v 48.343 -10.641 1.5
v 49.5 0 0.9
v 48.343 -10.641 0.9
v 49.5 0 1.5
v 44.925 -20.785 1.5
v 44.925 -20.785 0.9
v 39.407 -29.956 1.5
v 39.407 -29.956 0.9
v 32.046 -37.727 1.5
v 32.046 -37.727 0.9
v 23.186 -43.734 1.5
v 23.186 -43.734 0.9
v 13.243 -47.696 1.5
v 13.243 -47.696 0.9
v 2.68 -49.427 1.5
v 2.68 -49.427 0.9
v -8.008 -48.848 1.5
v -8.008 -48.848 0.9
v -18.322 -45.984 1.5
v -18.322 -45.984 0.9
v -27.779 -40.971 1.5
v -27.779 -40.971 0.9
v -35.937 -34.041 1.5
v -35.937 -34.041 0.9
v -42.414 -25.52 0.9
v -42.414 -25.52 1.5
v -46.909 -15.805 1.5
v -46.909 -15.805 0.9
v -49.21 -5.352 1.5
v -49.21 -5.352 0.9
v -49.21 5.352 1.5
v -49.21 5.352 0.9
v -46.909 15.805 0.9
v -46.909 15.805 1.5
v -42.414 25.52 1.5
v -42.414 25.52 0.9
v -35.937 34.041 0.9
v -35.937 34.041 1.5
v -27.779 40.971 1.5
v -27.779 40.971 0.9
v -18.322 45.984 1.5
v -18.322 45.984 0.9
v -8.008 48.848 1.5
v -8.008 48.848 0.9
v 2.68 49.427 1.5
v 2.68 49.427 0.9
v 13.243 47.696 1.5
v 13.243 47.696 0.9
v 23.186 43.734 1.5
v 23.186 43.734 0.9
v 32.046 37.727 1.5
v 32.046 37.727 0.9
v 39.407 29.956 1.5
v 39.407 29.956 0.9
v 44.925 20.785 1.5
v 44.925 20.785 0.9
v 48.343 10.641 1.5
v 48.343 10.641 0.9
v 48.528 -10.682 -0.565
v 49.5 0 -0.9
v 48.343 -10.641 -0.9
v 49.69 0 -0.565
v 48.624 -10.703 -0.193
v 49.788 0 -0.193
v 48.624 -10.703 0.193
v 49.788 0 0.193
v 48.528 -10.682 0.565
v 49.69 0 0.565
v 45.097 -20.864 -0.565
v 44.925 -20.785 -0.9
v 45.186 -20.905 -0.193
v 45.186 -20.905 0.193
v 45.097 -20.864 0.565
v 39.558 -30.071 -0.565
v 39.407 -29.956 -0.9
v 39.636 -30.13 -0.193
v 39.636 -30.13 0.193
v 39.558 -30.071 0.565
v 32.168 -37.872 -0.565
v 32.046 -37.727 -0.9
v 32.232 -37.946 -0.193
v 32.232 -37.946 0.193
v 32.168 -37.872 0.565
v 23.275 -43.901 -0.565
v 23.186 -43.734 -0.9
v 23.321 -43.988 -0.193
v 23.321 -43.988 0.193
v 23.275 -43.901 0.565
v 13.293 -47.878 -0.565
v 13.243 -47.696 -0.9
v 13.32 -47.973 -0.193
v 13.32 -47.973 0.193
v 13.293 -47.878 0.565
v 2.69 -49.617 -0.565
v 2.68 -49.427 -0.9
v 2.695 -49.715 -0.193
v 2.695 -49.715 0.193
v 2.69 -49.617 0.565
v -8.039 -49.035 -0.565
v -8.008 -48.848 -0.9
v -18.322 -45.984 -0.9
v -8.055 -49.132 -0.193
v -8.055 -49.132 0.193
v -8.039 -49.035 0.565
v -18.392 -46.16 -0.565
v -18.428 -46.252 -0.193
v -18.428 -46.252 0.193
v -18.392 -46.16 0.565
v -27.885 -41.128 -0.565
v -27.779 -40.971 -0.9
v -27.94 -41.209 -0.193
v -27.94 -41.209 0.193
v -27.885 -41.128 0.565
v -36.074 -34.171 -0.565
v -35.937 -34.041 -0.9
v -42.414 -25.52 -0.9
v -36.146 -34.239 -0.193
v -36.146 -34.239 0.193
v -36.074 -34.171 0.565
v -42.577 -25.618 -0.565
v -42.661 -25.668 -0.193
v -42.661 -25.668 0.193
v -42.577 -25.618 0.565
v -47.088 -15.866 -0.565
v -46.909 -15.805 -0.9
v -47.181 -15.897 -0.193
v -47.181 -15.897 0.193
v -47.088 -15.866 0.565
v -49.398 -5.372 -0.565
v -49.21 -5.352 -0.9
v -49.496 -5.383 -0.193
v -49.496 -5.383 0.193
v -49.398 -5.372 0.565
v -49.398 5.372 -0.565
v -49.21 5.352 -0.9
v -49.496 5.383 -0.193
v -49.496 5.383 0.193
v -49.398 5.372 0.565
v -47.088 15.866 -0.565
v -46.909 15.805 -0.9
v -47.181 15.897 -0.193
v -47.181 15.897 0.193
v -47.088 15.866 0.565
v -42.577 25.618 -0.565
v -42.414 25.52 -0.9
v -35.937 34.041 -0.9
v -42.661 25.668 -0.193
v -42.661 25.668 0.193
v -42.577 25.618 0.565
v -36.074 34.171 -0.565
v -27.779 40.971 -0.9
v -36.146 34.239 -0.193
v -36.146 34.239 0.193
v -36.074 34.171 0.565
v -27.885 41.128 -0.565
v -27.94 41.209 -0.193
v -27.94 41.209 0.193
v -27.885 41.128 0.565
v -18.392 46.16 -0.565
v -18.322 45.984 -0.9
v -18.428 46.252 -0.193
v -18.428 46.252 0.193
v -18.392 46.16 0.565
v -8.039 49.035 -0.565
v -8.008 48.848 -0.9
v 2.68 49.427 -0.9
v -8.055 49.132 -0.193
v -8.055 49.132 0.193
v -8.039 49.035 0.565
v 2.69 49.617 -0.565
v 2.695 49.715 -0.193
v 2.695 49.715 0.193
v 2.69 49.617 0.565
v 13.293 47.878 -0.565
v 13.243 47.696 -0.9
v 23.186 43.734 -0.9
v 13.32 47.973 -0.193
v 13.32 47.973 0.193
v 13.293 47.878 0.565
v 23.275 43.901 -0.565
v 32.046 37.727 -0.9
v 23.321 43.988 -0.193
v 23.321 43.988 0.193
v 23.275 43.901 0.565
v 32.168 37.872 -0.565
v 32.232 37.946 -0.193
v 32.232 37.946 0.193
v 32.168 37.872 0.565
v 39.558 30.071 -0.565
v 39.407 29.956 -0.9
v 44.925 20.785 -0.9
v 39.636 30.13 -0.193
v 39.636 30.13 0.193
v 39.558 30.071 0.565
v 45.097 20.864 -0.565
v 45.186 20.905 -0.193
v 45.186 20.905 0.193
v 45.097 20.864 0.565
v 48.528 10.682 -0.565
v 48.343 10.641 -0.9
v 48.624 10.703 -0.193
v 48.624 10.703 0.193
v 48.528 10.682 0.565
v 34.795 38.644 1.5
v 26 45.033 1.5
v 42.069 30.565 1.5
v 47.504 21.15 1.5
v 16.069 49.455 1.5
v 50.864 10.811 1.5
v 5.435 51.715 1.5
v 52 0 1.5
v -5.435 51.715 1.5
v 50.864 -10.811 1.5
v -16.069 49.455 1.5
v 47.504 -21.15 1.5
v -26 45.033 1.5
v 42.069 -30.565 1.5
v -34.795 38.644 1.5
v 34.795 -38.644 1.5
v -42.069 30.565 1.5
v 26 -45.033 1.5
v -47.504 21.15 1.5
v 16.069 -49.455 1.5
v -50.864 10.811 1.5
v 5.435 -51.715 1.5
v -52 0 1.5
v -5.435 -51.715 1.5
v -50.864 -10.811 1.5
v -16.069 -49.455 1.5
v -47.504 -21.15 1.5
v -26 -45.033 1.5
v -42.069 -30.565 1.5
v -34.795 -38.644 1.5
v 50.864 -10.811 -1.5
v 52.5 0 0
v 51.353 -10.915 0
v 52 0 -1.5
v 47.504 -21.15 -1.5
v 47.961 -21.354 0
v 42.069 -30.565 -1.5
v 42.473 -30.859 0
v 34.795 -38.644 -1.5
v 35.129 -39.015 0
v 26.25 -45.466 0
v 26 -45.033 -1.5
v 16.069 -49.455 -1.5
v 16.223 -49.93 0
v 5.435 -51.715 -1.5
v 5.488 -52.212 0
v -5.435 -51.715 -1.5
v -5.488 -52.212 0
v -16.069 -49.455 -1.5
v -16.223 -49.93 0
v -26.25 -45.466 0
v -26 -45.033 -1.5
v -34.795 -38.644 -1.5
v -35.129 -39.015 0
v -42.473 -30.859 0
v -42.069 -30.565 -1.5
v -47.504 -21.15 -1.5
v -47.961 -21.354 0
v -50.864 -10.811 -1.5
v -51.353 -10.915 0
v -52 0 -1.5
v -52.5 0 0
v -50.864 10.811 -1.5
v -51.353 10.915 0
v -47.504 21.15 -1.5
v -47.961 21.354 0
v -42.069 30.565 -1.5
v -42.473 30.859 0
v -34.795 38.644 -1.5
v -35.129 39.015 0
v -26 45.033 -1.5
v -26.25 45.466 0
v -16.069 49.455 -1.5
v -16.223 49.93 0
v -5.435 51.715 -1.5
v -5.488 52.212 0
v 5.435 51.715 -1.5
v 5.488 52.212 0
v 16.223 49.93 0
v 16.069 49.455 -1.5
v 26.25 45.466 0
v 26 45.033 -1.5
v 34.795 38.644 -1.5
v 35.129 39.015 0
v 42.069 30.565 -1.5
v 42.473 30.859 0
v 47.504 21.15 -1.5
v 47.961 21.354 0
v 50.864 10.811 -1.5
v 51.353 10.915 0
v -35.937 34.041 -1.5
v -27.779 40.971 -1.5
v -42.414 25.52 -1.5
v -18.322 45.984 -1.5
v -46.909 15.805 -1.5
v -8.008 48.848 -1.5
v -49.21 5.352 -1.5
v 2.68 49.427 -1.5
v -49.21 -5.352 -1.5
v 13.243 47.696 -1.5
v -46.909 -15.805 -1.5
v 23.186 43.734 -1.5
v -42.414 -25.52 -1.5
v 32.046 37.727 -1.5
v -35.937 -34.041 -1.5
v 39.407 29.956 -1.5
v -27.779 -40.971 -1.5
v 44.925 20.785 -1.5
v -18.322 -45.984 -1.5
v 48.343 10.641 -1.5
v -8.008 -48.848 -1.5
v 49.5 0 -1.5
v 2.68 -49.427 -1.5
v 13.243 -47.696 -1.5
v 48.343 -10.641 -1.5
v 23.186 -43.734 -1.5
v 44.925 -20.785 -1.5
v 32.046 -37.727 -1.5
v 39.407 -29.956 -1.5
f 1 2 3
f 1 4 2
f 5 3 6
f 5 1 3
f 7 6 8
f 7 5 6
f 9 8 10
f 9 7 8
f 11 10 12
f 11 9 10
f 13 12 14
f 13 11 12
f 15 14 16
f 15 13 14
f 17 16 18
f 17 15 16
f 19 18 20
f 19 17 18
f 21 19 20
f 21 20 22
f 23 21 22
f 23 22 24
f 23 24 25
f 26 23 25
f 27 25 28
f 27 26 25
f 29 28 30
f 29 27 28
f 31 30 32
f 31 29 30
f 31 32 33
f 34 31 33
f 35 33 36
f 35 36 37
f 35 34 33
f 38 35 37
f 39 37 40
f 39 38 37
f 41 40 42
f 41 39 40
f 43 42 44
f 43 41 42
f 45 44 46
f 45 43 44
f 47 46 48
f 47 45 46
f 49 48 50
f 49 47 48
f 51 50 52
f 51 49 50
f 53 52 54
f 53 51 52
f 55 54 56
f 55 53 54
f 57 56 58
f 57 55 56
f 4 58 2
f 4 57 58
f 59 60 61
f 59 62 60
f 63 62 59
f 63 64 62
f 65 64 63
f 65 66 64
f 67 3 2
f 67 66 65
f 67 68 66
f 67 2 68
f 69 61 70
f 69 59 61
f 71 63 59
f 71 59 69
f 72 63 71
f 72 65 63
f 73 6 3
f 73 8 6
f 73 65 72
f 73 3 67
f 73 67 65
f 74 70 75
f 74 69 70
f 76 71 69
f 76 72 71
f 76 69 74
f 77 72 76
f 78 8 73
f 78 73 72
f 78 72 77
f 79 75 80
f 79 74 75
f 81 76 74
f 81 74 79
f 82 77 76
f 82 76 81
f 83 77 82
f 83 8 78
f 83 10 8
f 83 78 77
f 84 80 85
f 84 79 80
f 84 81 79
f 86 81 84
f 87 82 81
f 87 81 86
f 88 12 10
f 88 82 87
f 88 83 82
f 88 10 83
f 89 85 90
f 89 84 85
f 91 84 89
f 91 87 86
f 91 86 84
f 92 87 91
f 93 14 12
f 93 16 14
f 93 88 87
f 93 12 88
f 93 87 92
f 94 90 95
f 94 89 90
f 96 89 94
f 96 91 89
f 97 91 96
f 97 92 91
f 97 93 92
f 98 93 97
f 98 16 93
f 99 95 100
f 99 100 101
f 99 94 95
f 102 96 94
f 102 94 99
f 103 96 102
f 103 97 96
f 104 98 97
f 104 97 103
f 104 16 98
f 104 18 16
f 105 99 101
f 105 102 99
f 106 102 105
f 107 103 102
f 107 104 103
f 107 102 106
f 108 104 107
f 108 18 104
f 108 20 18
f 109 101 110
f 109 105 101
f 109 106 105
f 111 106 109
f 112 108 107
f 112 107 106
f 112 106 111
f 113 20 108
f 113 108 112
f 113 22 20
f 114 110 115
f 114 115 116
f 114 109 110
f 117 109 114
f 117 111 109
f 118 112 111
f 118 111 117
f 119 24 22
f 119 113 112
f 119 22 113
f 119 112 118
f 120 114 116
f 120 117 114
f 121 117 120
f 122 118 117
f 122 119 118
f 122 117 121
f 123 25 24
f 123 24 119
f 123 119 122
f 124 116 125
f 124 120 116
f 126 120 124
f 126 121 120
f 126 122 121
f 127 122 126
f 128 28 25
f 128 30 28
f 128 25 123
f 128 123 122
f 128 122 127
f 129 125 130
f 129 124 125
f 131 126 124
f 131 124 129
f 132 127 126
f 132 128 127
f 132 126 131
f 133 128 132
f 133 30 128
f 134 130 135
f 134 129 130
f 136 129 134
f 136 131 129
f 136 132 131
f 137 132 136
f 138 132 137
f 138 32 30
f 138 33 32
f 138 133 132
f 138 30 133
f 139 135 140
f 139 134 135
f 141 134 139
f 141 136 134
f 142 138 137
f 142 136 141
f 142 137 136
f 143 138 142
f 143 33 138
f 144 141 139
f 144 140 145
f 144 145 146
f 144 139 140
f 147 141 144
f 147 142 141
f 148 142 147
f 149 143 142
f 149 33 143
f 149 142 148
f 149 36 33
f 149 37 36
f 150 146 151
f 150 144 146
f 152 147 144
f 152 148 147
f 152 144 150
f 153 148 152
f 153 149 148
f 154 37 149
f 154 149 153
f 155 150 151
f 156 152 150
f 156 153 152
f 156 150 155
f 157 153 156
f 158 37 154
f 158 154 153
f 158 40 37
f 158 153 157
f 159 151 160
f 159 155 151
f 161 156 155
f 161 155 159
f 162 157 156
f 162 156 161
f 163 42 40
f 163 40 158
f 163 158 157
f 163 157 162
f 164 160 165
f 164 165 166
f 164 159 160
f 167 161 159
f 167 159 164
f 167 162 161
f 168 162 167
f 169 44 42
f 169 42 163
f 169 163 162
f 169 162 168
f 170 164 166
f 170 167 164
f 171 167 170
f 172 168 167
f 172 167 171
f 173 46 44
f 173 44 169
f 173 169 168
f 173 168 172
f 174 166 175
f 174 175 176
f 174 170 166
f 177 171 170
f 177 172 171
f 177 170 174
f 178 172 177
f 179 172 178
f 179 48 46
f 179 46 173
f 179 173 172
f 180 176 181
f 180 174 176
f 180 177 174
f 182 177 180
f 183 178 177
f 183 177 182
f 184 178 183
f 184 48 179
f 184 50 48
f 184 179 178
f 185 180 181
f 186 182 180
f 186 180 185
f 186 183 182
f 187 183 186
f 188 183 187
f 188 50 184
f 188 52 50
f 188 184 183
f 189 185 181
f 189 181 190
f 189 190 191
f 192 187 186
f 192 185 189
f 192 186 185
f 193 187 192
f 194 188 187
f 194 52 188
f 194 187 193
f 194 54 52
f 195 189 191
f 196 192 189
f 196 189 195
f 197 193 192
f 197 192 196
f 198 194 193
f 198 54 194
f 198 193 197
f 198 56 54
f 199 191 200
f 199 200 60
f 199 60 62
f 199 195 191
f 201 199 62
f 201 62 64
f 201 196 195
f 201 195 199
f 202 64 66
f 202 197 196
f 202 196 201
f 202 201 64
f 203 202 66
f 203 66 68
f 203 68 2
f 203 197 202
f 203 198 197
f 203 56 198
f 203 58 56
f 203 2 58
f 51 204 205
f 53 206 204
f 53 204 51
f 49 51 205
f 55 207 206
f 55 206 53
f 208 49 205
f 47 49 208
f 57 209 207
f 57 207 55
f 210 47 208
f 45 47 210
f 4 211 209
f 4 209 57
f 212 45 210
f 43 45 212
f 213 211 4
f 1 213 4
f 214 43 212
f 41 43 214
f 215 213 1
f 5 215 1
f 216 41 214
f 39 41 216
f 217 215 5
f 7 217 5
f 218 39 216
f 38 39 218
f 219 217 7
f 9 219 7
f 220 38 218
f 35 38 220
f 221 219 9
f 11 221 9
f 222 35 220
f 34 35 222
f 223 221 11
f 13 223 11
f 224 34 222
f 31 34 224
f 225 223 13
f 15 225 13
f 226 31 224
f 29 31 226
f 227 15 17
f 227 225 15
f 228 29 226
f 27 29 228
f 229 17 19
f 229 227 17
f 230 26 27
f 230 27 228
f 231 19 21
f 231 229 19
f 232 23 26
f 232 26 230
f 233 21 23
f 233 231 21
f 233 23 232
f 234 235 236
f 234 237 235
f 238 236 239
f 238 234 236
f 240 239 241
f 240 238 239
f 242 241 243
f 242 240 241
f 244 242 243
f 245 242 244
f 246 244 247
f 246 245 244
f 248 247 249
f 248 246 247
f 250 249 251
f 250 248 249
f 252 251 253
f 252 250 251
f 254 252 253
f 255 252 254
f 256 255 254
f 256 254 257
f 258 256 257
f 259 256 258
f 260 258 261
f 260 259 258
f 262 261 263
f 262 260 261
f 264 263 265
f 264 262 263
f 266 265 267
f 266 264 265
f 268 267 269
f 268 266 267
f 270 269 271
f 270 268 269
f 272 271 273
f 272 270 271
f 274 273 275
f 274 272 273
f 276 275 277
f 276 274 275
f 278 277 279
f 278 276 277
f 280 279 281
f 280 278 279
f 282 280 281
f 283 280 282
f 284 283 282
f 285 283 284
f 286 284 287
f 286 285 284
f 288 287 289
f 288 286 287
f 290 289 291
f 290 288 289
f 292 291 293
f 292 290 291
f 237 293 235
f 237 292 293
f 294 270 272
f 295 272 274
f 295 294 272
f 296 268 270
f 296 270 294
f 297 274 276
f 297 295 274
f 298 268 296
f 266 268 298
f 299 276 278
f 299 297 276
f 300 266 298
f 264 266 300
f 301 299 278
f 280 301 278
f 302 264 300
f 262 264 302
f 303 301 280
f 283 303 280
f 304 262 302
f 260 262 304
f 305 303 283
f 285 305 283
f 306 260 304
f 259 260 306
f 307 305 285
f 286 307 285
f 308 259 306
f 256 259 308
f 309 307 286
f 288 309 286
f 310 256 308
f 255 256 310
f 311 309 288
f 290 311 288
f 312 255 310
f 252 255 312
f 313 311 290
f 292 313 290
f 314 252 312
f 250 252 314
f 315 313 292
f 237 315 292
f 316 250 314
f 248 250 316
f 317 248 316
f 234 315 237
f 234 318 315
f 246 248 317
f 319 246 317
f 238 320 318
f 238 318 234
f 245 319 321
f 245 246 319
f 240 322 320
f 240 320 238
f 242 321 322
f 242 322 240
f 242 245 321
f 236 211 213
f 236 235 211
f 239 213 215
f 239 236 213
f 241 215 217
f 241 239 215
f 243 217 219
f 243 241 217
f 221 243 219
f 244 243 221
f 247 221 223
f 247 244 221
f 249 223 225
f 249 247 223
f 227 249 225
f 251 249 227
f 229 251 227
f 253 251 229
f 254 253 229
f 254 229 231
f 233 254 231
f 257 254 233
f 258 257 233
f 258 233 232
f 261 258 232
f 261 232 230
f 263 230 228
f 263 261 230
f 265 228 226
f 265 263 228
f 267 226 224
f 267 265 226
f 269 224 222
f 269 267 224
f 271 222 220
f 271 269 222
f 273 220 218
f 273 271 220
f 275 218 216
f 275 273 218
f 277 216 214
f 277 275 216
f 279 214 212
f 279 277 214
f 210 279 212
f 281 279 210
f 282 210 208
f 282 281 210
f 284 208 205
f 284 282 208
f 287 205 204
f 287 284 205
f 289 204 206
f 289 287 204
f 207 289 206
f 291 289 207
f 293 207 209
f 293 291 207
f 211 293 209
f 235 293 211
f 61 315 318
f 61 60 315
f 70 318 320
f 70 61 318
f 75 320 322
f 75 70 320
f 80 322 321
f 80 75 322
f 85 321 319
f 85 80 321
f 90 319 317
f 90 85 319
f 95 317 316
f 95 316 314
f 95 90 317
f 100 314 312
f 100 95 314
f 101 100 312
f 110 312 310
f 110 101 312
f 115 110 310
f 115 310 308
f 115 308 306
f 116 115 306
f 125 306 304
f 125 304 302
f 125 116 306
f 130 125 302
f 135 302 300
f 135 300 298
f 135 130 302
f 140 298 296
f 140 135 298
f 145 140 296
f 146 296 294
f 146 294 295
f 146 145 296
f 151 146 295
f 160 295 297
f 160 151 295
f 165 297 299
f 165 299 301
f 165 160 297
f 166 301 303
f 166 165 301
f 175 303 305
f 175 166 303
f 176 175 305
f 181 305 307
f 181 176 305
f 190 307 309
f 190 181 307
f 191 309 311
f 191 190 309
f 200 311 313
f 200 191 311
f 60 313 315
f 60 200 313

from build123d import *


with BuildPart() as part:
    # Sketch1 → Revolve1 (revolve)
    with BuildSketch(Plane(origin=(0, 0, 0), x_dir=(0, 0, -1), z_dir=(1, 0, 0)), mode=Mode.PRIVATE) as revolve1_sk:
        with BuildLine():
            Line((0, 52.5), (1.5, 52))
            Line((1.5, 52), (1.5, 49.5))
            Line((1.5, 49.5), (0.9, 49.5))
            ThreePointArc((0.9, 49.5), (0, 49.8), (-0.9, 49.5))
            Line((-0.9, 49.5), (-1.5, 49.5))
            Line((-1.5, 49.5), (-1.5, 52))
            Line((-1.5, 52), (0, 52.5))
        make_face()
    revolve(revolve1_sk.sketch.rotate(Axis((0, 0, 0), (0, 0, -1)), 90), axis=Axis((0, 0, 0), (0, 0, -1)))


solid = part.part
